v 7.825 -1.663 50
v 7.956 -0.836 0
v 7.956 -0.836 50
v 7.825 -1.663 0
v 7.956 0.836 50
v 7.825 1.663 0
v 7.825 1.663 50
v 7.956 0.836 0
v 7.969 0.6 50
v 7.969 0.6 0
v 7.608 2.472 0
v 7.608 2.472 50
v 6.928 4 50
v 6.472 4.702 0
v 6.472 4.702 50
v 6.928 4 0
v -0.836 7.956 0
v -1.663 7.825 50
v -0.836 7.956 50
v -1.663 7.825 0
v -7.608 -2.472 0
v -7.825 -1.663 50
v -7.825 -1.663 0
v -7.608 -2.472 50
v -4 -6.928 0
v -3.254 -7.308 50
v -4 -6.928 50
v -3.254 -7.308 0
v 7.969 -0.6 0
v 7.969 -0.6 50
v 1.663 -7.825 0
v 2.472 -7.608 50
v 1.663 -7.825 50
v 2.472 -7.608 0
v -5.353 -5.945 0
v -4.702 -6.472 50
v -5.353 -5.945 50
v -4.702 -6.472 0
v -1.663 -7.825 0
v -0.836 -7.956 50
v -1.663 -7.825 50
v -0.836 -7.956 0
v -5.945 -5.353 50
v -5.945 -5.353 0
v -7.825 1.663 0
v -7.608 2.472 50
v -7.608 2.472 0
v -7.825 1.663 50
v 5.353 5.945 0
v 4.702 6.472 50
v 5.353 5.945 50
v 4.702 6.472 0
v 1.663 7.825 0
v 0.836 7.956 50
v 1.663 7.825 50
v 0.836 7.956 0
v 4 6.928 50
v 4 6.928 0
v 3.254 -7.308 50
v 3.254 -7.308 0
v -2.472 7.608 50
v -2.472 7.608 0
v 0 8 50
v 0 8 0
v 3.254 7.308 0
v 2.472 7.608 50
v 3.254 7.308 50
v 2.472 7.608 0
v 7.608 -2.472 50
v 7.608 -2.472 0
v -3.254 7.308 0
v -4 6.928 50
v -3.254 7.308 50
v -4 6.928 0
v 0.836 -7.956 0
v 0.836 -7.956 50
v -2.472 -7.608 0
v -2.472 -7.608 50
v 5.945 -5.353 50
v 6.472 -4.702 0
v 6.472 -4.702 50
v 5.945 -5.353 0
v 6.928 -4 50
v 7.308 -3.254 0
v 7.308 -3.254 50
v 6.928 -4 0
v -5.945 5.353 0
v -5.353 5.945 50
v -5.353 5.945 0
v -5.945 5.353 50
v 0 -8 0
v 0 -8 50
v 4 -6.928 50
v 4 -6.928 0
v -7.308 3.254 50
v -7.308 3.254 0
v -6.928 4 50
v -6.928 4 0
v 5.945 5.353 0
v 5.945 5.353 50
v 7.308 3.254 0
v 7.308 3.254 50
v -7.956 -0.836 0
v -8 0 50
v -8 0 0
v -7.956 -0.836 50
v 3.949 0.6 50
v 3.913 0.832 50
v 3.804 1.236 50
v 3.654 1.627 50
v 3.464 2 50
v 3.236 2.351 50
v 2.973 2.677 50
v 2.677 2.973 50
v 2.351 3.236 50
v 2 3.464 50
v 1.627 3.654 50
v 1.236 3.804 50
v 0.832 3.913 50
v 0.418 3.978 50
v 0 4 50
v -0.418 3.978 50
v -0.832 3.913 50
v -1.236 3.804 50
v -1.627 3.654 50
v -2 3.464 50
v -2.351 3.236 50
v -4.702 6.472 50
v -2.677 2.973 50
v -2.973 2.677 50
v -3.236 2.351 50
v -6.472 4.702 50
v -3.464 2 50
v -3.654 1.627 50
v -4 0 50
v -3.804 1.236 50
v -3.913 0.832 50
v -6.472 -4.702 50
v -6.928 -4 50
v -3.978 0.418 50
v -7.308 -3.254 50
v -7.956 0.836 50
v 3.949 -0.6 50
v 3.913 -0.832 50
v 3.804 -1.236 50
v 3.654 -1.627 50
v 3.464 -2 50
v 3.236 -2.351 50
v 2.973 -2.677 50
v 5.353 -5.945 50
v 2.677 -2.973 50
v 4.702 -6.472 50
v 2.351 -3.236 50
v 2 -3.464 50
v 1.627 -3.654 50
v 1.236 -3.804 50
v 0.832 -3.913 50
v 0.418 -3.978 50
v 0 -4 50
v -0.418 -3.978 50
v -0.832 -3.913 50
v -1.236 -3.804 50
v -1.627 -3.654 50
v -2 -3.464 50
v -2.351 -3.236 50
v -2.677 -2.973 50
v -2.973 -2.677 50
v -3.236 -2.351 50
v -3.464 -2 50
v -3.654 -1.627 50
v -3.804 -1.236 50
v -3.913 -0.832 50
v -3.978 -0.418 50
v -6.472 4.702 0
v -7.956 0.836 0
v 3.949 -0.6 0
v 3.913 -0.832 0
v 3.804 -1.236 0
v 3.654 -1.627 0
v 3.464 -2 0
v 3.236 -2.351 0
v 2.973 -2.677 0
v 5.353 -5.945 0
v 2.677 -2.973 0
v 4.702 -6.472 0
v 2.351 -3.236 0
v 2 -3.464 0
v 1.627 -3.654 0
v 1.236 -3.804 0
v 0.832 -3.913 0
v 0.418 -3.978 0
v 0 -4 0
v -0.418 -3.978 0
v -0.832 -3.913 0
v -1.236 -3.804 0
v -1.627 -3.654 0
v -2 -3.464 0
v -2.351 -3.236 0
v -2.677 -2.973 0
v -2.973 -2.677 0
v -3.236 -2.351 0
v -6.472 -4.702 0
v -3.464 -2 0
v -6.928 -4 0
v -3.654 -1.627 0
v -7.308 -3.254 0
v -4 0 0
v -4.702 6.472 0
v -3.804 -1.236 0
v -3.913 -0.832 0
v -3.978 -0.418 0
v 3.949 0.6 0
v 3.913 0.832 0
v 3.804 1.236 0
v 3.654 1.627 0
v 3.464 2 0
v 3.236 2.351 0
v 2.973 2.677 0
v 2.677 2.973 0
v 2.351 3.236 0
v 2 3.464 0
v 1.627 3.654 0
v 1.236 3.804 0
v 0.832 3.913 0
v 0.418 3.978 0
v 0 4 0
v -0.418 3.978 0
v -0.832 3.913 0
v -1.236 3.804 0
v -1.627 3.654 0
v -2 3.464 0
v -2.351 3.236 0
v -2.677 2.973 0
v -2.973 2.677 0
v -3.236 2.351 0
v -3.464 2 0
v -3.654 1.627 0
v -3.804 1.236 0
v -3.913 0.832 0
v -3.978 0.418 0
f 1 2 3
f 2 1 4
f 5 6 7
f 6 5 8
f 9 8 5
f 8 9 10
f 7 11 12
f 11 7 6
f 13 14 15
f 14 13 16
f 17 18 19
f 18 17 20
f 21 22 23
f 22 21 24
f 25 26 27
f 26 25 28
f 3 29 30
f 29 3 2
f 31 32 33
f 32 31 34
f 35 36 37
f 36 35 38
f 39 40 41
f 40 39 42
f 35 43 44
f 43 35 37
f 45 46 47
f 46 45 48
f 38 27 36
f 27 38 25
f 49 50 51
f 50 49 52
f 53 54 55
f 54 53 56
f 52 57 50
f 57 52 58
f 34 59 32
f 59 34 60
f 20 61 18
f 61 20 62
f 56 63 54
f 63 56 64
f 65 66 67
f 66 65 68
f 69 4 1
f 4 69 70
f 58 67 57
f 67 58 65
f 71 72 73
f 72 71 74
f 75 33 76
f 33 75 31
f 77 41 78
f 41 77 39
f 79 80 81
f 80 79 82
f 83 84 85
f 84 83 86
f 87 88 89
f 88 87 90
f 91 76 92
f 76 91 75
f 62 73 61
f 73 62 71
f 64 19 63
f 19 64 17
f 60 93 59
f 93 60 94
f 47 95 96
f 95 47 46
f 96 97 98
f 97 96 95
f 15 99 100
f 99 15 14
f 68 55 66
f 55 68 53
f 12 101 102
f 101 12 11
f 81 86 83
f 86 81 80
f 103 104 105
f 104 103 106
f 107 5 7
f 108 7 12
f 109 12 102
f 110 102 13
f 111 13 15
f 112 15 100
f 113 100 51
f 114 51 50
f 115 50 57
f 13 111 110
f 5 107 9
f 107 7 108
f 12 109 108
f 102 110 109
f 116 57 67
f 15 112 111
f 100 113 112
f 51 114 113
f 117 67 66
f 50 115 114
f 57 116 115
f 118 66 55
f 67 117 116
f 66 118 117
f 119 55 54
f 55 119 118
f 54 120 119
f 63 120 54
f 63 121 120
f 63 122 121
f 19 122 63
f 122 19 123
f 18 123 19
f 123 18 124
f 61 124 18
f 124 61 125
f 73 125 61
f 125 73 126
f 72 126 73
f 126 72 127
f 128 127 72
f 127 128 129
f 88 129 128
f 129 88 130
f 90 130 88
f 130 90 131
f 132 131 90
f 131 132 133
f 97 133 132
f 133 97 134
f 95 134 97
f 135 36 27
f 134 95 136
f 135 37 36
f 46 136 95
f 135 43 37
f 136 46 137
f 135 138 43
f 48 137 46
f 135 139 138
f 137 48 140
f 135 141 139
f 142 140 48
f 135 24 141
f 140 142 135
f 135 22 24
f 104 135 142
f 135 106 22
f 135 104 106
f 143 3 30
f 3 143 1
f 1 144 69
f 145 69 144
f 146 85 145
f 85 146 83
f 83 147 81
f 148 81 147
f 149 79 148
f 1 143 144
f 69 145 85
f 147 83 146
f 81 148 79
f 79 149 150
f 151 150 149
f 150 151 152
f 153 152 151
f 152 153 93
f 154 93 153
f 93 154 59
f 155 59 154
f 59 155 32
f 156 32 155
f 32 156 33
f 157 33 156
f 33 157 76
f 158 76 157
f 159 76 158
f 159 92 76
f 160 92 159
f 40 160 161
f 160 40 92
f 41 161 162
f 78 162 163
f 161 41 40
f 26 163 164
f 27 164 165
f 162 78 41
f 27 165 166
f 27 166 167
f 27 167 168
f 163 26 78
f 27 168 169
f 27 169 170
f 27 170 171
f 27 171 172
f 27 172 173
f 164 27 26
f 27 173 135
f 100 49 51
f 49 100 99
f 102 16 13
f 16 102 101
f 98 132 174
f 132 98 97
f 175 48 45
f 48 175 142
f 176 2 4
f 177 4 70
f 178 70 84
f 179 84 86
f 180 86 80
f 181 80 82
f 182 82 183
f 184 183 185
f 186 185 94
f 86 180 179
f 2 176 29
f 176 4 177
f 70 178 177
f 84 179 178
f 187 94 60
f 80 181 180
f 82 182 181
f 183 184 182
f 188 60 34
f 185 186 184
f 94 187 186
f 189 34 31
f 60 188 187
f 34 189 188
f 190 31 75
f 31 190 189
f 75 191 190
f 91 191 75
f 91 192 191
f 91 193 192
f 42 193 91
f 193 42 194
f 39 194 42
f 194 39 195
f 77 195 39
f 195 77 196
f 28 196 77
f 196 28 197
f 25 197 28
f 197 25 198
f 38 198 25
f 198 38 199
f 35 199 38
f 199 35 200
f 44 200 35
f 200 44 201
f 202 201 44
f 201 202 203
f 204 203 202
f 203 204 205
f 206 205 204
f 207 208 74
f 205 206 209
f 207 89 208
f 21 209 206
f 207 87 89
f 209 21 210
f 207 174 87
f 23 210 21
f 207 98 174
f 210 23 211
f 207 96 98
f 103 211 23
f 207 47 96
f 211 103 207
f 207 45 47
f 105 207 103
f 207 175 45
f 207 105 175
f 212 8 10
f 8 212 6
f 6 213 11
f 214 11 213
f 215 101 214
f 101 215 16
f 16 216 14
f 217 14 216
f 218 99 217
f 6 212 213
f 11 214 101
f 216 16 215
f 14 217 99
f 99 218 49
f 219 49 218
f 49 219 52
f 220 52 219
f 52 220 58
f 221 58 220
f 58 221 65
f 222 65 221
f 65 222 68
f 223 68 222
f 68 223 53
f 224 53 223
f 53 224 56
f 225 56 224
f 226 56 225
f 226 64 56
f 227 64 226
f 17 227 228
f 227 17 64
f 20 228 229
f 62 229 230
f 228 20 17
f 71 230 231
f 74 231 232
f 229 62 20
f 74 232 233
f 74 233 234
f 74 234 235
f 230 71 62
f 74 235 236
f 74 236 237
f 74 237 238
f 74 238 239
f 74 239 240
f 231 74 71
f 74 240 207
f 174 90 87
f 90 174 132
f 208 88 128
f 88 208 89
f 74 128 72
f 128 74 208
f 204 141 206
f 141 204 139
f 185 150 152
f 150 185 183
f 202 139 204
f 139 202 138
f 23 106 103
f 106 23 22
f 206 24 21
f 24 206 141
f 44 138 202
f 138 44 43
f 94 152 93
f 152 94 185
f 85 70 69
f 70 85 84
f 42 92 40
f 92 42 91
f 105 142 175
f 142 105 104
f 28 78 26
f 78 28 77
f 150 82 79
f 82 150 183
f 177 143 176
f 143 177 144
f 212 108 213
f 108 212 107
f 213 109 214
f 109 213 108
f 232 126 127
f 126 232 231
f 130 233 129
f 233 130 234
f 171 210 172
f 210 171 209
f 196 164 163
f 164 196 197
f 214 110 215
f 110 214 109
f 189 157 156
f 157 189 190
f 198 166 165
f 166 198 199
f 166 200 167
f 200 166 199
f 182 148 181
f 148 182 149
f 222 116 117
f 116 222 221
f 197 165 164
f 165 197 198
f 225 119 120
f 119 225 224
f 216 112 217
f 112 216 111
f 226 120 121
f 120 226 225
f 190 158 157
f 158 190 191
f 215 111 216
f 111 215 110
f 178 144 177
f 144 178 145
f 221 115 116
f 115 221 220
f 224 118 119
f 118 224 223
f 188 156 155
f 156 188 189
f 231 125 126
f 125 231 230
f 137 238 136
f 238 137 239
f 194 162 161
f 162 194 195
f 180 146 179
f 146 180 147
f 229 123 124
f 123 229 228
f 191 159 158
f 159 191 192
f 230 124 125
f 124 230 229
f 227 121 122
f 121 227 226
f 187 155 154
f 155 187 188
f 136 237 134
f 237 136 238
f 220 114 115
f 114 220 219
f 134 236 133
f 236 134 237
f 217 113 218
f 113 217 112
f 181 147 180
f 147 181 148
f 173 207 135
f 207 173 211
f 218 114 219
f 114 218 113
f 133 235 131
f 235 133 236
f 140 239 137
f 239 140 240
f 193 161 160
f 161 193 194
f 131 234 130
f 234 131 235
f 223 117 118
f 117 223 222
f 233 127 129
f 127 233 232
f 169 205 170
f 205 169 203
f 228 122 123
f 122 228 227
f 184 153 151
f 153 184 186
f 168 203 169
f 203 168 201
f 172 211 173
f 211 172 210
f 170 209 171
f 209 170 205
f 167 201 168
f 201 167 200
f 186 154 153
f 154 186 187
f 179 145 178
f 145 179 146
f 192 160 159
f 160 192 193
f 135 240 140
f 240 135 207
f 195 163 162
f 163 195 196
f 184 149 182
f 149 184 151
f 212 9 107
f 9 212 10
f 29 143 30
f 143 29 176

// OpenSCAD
// Slotted spring pin sleeve.
$fn = 60;
eps = 0.02;
inner_d = 8;
outer_d = 16;
length = 50;
slot_w = 1.2;
difference() {
    cylinder(d = outer_d, h = length);
    translate([0, 0, -eps]) cylinder(d = inner_d, h = length + 2 * eps);
    translate([0, -slot_w / 2, -eps]) cube([outer_d / 2 + eps, slot_w, length + 2 * eps]);
}
